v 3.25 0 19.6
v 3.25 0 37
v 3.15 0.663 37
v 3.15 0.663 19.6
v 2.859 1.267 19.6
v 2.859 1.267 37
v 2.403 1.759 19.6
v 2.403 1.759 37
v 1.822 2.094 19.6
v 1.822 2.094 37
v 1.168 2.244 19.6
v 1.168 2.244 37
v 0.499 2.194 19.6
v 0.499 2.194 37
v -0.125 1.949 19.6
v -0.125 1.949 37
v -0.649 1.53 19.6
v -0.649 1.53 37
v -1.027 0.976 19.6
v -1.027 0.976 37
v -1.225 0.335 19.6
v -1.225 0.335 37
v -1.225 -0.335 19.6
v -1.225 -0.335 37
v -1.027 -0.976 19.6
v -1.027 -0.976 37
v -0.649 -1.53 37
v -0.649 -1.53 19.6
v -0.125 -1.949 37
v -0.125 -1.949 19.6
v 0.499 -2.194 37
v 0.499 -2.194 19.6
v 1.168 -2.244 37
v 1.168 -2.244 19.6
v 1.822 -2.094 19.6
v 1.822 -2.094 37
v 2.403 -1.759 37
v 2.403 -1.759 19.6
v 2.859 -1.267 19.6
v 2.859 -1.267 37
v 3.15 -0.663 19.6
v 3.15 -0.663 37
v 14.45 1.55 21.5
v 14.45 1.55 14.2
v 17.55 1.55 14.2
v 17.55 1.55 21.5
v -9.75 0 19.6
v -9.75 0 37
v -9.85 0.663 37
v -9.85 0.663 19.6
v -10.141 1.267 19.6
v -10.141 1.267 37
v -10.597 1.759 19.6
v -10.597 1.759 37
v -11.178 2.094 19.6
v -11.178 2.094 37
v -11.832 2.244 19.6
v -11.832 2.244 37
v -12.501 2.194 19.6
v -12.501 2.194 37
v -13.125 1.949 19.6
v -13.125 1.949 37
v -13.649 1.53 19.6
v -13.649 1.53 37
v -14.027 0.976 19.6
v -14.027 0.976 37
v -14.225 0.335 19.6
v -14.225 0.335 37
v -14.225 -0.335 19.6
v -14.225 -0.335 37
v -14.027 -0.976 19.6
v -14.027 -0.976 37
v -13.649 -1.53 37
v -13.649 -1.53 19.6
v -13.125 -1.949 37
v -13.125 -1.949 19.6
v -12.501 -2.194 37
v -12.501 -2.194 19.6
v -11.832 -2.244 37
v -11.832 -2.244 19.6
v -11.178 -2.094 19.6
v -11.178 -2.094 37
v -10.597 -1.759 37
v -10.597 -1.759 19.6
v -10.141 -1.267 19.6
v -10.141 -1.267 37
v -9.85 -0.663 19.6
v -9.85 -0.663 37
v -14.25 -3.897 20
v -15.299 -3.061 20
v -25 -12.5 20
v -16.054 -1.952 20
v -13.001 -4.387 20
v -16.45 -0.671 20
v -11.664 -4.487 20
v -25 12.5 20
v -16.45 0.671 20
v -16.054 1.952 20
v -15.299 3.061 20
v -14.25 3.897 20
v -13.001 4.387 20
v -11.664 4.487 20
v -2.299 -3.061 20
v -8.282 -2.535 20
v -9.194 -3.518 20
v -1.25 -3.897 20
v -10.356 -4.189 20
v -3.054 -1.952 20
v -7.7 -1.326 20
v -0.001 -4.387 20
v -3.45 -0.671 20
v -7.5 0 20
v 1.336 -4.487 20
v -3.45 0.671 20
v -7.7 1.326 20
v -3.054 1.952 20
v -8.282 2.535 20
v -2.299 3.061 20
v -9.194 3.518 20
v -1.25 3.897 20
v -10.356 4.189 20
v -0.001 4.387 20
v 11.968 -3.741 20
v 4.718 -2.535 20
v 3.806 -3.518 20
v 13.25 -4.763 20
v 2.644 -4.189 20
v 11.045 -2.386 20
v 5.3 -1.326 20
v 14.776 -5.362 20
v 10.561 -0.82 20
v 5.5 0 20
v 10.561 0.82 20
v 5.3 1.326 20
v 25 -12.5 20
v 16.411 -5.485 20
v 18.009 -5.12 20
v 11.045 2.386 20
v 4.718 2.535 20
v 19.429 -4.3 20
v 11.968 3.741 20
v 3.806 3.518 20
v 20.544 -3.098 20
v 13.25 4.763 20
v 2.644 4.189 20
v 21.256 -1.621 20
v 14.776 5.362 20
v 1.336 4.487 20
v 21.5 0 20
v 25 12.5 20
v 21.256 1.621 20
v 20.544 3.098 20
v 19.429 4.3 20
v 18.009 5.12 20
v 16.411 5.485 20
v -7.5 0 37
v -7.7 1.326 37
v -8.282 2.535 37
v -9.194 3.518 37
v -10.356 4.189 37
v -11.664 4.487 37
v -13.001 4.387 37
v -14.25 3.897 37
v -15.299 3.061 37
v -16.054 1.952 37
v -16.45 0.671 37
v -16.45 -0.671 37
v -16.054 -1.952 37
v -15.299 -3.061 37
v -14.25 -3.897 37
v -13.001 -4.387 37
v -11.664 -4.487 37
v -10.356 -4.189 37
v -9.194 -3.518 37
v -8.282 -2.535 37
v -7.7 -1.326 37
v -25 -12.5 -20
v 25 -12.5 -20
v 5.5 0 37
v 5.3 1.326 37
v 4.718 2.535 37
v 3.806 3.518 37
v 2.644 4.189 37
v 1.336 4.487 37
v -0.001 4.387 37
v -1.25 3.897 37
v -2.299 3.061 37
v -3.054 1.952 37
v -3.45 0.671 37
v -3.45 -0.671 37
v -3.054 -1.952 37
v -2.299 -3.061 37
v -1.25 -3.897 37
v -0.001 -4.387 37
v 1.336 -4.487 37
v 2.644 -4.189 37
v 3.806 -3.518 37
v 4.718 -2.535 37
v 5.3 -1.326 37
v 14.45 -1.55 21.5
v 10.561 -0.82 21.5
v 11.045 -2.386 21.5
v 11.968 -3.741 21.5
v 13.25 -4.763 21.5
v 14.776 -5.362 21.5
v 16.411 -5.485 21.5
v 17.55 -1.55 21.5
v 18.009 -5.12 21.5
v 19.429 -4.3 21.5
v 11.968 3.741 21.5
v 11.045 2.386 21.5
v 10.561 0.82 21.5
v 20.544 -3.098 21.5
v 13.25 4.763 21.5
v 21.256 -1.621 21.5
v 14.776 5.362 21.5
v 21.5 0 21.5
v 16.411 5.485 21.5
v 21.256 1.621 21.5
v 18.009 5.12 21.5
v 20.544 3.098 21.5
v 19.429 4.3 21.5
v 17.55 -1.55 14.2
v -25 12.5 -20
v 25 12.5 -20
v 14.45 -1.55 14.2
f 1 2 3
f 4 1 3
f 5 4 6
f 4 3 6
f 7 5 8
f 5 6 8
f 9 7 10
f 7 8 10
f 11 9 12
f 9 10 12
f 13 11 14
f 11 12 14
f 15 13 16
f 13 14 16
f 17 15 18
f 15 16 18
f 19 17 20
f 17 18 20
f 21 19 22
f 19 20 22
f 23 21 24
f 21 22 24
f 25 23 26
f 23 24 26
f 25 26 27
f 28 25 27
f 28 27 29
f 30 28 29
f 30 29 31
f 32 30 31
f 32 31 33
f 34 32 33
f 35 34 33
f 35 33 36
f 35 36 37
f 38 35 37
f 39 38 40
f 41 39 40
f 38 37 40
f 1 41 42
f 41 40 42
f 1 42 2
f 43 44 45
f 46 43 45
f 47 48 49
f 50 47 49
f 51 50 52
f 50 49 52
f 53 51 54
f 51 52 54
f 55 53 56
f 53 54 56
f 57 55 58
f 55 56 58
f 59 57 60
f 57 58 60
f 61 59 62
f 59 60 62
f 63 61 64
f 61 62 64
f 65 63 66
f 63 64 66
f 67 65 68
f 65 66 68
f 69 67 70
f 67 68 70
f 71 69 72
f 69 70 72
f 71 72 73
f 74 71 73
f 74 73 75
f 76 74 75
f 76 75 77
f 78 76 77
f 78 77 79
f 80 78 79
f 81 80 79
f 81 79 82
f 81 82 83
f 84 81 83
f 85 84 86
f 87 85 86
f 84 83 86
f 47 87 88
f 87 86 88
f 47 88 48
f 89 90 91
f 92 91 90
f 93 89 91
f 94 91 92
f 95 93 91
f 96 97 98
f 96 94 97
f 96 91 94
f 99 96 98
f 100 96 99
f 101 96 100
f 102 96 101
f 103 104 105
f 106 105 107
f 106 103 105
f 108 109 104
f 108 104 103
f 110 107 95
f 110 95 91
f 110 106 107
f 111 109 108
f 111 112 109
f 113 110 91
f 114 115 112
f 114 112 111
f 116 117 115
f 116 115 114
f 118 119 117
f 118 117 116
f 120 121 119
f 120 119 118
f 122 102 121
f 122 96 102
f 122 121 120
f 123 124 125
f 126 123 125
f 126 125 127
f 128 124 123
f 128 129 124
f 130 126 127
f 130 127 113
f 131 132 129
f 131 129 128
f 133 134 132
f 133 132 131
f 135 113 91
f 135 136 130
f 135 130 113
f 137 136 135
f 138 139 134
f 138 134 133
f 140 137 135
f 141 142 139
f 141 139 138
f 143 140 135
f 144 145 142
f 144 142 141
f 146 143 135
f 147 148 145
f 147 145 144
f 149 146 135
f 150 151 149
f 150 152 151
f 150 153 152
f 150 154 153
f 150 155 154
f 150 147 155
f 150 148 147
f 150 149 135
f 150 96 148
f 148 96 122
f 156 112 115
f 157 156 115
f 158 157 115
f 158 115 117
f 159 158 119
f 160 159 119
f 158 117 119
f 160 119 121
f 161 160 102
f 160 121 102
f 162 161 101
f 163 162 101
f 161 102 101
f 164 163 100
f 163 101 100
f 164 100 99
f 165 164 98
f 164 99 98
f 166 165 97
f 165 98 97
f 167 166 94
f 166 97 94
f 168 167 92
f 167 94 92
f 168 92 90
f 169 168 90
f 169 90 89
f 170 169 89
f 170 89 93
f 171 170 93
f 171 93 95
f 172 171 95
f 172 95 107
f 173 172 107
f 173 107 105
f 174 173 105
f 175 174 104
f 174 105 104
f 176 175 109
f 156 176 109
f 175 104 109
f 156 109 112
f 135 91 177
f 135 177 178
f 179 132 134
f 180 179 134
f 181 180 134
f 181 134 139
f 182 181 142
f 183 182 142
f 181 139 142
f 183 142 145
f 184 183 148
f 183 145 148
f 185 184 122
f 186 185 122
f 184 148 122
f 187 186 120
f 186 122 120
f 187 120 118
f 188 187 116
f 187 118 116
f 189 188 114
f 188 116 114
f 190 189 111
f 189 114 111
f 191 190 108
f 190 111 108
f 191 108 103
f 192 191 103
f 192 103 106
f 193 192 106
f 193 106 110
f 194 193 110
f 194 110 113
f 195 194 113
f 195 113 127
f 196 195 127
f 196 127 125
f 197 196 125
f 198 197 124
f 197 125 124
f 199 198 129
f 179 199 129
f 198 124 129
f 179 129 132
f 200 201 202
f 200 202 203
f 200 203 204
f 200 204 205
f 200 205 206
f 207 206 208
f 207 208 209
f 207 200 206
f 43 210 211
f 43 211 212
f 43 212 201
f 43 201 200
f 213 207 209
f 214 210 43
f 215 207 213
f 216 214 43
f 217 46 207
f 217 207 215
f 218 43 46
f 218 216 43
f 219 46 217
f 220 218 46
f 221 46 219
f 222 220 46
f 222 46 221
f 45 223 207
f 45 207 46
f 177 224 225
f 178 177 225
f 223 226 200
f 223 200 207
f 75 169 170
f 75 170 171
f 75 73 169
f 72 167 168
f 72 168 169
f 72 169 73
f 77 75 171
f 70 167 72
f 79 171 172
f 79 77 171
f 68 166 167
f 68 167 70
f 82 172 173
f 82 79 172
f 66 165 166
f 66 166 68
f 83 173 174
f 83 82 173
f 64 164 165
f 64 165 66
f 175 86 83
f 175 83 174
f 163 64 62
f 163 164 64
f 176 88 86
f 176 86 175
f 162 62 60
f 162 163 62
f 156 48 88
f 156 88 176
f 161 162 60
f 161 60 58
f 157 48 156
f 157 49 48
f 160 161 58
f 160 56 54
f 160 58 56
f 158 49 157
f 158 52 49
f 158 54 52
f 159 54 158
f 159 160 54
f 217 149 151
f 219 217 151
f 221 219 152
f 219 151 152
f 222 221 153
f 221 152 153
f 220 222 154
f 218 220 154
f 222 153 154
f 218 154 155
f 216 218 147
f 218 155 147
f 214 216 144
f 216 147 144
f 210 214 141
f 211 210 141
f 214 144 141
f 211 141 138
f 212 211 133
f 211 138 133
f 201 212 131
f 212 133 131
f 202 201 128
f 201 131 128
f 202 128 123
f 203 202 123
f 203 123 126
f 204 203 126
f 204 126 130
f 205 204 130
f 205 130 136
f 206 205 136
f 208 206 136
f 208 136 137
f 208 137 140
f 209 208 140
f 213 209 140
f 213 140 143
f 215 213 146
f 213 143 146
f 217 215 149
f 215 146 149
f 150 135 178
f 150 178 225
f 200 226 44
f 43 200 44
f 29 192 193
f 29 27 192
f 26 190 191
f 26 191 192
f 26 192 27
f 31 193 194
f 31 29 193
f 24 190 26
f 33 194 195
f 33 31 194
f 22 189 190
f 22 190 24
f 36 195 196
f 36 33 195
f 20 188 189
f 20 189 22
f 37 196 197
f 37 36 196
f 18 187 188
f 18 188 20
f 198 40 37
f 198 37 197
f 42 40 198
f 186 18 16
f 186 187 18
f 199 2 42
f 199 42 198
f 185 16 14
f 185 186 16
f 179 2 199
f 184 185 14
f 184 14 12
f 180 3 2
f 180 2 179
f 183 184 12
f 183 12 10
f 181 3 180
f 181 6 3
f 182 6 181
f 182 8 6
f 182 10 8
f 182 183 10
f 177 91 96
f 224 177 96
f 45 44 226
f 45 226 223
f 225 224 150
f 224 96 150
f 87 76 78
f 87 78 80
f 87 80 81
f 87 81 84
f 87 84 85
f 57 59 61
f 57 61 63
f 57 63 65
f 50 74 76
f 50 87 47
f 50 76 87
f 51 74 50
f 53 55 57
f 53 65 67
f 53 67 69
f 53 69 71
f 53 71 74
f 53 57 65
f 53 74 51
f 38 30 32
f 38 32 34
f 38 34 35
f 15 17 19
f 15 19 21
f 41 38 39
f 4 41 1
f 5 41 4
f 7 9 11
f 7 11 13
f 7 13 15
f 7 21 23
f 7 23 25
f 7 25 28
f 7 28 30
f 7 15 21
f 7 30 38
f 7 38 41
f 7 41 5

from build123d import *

# Parameters (mm, degrees)
F0_W     = 50
F0_H     = 25
F1_DEPTH = 20
F2_R     = 5.5
F3_DEPTH = 1.5
F2_R_2   = 4.5
F4_DEPTH = 17
F5_W     = 3.1
F5_H     = 3.1
F6_DEPTH = 7.3
F7_R     = 2.25
F8_DEPTH = 17.4


with BuildPart() as f1:
    # F0 (on Top) → F1 (new body, symmetric)
    with BuildSketch(Plane.XY):
        Rectangle(F0_W, F0_H)
    extrude(amount=F1_DEPTH, both=True)

    # F2 (on face) → F3 (join)
    with BuildSketch(Plane.XY.offset(20)):
        with Locations((16, 0)):
            Circle(F2_R)
    extrude(amount=F3_DEPTH)

    # F2 (on face) → F4 (join)
    with BuildSketch(Plane.XY.offset(20)):
        with Locations((-12, 0)):
            Circle(F2_R_2)
        with Locations((1, 0)):
            Circle(F2_R_2)
    extrude(amount=F4_DEPTH)

    # F5 (on face) → F6 (cut)
    with BuildSketch(Plane.XY.offset(21.5)):
        with Locations((16, 0)):
            Rectangle(F5_W, F5_H)
    extrude(amount=-F6_DEPTH, mode=Mode.SUBTRACT)

    # F7 (on face) → F8 (cut)
    with BuildSketch(Plane.XY.offset(37)):
        with Locations((-12, 0)):
            Circle(F7_R)
        with Locations((1, 0)):
            Circle(F7_R)
    extrude(amount=-F8_DEPTH, mode=Mode.SUBTRACT)


solid = f1.part
